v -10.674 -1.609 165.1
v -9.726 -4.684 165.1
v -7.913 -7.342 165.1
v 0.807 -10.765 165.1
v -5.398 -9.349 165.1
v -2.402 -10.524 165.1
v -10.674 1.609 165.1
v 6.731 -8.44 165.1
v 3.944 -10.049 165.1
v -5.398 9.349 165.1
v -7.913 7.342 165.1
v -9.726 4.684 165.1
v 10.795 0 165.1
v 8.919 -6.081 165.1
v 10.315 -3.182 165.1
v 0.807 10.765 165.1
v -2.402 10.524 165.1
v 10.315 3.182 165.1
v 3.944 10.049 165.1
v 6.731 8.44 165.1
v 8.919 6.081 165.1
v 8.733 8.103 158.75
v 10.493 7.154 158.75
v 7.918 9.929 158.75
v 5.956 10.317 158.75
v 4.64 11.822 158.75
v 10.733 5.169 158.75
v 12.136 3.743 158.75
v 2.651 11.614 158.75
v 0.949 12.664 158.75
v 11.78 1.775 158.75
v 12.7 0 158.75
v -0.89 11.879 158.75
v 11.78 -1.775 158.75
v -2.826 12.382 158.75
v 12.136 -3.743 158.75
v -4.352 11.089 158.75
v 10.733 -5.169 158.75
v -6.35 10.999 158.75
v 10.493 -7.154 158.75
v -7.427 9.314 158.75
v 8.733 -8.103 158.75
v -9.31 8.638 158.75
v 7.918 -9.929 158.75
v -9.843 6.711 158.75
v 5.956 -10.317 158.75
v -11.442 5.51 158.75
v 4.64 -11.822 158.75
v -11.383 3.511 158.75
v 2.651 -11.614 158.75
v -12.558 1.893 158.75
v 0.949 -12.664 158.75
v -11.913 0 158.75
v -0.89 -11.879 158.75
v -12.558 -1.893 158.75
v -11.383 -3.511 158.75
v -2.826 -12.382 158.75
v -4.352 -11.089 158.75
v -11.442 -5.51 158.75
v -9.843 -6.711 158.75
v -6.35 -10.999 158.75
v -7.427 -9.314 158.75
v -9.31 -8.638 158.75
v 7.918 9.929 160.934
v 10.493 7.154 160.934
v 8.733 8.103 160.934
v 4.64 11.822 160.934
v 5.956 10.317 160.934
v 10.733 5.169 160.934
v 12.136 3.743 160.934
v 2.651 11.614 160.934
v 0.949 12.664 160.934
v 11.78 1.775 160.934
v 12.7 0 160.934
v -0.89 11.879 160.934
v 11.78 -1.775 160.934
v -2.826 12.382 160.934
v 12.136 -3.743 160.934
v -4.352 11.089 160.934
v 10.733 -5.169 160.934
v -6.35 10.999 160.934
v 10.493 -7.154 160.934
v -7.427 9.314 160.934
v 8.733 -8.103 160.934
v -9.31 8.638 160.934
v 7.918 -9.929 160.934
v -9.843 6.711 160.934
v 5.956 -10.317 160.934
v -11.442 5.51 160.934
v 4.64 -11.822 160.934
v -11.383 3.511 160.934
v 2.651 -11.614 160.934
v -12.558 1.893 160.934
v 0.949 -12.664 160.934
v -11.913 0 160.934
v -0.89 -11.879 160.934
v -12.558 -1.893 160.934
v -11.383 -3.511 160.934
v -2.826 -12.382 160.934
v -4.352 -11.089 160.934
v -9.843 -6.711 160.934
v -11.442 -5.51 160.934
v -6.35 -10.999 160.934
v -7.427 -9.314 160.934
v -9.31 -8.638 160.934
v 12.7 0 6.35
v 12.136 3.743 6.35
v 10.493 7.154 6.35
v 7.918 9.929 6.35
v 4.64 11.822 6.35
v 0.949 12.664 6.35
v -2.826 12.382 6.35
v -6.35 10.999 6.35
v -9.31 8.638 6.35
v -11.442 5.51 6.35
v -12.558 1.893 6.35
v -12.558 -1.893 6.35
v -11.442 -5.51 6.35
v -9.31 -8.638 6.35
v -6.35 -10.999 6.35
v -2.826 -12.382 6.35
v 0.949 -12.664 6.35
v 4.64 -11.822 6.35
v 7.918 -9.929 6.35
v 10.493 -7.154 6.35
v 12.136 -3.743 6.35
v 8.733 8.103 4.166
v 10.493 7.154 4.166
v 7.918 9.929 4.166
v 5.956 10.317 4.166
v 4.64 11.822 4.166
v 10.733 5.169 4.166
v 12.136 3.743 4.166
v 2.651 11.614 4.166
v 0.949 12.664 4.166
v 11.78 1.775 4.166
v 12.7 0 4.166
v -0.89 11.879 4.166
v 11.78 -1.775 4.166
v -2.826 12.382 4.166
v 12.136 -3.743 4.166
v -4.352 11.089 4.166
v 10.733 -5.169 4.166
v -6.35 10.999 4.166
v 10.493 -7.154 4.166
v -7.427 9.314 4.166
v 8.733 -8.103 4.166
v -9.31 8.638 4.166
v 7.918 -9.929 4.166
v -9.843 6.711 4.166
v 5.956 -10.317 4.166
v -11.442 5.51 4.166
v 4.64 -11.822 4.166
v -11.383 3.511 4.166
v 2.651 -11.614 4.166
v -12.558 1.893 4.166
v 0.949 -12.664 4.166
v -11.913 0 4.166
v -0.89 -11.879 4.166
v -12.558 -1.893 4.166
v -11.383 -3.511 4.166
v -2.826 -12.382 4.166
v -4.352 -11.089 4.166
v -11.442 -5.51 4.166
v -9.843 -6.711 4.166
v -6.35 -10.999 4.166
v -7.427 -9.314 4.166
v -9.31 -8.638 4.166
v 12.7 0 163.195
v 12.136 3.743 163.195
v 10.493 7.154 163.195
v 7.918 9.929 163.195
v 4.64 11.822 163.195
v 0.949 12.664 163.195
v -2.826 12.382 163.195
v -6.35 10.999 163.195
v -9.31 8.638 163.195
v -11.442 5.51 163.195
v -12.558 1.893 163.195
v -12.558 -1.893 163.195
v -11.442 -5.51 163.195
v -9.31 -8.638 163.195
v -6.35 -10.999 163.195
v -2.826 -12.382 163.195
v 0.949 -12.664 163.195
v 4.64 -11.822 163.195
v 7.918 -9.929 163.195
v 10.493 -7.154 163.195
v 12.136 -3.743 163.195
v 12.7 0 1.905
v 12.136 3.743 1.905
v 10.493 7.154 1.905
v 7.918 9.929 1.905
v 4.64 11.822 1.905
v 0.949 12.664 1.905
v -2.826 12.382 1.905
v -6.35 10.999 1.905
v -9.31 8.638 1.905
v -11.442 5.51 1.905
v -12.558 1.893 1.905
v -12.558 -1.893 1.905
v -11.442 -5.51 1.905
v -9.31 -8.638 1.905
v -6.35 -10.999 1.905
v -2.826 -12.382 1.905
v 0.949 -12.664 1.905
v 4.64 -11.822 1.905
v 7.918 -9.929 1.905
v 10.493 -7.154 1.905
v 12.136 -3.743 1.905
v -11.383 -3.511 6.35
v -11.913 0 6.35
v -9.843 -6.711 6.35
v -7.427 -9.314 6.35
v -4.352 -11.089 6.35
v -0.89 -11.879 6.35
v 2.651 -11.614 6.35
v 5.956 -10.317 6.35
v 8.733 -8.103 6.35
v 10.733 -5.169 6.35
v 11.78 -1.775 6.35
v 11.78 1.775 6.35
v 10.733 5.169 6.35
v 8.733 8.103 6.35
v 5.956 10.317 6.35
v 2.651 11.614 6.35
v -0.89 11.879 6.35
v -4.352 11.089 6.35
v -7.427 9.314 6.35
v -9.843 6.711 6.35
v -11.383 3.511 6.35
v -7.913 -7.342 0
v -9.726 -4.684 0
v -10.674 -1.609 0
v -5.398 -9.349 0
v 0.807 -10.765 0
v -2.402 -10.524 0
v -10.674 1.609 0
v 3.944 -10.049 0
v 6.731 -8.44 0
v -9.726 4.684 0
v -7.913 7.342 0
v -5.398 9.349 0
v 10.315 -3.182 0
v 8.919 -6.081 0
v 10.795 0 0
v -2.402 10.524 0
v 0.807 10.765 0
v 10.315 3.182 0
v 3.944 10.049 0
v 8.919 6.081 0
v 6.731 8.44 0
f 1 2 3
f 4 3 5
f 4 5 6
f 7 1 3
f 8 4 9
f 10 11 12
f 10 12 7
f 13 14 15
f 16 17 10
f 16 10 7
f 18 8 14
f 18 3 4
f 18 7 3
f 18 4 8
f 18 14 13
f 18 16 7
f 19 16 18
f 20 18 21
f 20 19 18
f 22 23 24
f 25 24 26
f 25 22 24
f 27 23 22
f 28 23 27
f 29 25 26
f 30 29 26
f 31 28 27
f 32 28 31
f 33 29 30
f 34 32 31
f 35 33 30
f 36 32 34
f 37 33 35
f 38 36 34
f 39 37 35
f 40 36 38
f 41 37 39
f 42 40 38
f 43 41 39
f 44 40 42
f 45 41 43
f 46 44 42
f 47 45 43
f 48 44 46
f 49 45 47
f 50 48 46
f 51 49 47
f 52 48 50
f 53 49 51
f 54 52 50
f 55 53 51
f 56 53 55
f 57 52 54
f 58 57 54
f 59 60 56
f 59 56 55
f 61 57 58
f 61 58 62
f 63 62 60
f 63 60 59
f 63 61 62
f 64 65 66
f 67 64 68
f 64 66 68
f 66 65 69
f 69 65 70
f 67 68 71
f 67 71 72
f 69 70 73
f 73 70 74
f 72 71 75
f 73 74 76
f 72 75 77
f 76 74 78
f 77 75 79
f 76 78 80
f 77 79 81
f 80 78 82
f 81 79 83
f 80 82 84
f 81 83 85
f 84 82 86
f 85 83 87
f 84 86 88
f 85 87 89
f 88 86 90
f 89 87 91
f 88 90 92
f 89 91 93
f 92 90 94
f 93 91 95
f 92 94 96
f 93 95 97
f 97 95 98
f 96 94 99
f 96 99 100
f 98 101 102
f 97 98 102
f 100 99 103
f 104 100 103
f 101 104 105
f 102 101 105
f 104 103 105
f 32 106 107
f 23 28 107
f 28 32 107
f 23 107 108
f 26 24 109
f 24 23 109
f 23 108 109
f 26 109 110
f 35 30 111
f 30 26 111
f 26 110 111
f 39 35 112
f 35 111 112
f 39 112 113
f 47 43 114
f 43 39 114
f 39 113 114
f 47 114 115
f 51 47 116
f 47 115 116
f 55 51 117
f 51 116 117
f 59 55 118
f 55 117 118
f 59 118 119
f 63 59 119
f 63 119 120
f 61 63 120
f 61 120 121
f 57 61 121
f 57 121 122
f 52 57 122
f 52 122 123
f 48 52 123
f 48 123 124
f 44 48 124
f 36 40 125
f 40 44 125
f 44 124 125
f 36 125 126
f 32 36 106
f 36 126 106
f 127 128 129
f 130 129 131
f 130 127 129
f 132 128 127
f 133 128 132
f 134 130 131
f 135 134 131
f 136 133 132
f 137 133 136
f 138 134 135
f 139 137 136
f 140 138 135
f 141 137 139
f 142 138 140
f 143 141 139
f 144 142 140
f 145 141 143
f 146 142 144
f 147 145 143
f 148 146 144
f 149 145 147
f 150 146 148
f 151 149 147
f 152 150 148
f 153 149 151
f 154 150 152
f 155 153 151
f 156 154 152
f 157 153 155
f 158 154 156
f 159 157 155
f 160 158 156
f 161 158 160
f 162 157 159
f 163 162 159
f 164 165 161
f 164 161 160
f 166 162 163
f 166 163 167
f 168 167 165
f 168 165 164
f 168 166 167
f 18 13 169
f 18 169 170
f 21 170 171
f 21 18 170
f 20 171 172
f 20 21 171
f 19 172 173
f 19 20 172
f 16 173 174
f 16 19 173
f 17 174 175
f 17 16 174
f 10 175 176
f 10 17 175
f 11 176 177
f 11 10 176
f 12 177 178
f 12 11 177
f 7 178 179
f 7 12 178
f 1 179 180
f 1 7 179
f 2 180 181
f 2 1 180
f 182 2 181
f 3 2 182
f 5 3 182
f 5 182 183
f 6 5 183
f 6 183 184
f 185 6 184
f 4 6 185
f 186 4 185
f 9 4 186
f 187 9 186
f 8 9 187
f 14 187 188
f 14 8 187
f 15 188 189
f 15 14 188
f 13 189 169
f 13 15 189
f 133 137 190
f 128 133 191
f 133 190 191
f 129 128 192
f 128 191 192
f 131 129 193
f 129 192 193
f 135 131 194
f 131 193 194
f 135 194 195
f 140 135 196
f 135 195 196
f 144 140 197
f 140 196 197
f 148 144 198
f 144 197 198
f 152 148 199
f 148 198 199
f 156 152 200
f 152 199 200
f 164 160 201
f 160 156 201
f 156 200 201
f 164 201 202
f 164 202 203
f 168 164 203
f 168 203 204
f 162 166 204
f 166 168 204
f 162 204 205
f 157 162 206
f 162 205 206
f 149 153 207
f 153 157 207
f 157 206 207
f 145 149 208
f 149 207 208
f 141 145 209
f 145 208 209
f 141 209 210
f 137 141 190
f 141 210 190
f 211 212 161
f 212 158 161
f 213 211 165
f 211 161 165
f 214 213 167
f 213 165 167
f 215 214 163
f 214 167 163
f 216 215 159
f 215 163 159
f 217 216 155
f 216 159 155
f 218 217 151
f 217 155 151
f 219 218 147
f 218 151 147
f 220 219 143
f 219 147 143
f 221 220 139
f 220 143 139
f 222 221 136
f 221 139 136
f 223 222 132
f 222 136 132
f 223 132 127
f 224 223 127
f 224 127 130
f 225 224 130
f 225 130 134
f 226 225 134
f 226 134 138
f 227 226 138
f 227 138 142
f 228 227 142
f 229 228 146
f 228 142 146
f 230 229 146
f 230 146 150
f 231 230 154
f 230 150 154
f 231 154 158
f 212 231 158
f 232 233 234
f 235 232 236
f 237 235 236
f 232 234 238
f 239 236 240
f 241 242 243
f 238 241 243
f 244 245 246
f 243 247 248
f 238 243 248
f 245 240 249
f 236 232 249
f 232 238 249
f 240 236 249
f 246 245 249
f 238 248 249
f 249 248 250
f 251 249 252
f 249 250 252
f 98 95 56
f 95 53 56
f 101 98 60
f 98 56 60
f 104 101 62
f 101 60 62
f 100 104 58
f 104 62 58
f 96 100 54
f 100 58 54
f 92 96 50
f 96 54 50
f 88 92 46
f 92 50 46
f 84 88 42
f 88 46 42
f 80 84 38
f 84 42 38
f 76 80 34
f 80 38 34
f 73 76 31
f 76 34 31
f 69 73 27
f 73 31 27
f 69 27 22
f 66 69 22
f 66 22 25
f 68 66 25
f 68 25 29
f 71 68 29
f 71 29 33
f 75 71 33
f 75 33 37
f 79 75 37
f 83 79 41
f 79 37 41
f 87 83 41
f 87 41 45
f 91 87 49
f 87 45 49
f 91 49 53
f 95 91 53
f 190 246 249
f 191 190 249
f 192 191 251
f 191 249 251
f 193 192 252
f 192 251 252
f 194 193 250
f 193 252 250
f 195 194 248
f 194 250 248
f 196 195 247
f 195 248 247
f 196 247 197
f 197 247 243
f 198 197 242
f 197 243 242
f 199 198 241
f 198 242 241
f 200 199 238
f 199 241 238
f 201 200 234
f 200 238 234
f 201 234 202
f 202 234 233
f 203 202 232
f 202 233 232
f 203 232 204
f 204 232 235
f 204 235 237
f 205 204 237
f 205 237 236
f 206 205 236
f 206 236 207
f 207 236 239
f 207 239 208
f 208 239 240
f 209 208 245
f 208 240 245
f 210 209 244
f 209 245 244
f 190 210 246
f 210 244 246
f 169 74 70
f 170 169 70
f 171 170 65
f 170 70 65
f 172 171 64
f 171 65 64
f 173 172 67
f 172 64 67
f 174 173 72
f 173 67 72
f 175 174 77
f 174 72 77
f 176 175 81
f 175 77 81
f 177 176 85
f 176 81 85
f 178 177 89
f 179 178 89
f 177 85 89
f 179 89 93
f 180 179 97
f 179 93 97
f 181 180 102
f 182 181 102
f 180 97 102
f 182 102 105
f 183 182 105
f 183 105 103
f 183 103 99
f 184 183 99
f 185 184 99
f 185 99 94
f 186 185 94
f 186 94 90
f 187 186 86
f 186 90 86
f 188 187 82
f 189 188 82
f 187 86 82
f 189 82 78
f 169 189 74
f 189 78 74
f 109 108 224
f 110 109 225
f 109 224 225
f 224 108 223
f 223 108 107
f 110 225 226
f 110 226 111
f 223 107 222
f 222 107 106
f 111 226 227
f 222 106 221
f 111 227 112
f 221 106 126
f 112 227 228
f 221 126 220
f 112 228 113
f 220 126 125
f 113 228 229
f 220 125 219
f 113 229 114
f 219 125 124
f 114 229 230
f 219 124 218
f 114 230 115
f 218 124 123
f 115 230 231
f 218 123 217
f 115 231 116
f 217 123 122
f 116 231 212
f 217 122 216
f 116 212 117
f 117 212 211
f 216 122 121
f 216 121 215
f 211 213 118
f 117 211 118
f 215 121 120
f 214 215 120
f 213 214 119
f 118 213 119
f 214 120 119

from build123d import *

# Parameters (mm, degrees)
SKETCH1_R           = 12.7
BOSS_EXTRUDE1_DEPTH = 165.1
SKETCH2_W           = 0.7874
SKETCH2_H           = 2.1844
CHAMFER1_SIZE       = 1.905


with BuildPart() as part:
    # Sketch1 → Boss-Extrude1 (new body)
    with BuildSketch(Plane.XY):
        Circle(SKETCH1_R)
    extrude(amount=BOSS_EXTRUDE1_DEPTH)

    # Sketch2 → Cut-Revolve1 (revolve, cut)
    with BuildSketch(Plane(origin=(0, 0, 0), x_dir=(1, 0, 0), z_dir=(0, 1, 0))):
        with Locations((-12.3063, -5.2578)):
            Rectangle(SKETCH2_W, SKETCH2_H)
        with Locations((-12.3063, -159.8422)):
            Rectangle(SKETCH2_W, SKETCH2_H)
    revolve(axis=Axis((0, 0, 0), (0, 0, 1)), mode=Mode.SUBTRACT)

    # Chamfer1
    chamfer1_edges = [part.edges().sort_by_distance(p)[0] for p in [
        (-12.7, 0, 0),
        (-12.7, 0, 165.1),
    ]]
    chamfer(chamfer1_edges, length=CHAMFER1_SIZE)


solid = part.part
